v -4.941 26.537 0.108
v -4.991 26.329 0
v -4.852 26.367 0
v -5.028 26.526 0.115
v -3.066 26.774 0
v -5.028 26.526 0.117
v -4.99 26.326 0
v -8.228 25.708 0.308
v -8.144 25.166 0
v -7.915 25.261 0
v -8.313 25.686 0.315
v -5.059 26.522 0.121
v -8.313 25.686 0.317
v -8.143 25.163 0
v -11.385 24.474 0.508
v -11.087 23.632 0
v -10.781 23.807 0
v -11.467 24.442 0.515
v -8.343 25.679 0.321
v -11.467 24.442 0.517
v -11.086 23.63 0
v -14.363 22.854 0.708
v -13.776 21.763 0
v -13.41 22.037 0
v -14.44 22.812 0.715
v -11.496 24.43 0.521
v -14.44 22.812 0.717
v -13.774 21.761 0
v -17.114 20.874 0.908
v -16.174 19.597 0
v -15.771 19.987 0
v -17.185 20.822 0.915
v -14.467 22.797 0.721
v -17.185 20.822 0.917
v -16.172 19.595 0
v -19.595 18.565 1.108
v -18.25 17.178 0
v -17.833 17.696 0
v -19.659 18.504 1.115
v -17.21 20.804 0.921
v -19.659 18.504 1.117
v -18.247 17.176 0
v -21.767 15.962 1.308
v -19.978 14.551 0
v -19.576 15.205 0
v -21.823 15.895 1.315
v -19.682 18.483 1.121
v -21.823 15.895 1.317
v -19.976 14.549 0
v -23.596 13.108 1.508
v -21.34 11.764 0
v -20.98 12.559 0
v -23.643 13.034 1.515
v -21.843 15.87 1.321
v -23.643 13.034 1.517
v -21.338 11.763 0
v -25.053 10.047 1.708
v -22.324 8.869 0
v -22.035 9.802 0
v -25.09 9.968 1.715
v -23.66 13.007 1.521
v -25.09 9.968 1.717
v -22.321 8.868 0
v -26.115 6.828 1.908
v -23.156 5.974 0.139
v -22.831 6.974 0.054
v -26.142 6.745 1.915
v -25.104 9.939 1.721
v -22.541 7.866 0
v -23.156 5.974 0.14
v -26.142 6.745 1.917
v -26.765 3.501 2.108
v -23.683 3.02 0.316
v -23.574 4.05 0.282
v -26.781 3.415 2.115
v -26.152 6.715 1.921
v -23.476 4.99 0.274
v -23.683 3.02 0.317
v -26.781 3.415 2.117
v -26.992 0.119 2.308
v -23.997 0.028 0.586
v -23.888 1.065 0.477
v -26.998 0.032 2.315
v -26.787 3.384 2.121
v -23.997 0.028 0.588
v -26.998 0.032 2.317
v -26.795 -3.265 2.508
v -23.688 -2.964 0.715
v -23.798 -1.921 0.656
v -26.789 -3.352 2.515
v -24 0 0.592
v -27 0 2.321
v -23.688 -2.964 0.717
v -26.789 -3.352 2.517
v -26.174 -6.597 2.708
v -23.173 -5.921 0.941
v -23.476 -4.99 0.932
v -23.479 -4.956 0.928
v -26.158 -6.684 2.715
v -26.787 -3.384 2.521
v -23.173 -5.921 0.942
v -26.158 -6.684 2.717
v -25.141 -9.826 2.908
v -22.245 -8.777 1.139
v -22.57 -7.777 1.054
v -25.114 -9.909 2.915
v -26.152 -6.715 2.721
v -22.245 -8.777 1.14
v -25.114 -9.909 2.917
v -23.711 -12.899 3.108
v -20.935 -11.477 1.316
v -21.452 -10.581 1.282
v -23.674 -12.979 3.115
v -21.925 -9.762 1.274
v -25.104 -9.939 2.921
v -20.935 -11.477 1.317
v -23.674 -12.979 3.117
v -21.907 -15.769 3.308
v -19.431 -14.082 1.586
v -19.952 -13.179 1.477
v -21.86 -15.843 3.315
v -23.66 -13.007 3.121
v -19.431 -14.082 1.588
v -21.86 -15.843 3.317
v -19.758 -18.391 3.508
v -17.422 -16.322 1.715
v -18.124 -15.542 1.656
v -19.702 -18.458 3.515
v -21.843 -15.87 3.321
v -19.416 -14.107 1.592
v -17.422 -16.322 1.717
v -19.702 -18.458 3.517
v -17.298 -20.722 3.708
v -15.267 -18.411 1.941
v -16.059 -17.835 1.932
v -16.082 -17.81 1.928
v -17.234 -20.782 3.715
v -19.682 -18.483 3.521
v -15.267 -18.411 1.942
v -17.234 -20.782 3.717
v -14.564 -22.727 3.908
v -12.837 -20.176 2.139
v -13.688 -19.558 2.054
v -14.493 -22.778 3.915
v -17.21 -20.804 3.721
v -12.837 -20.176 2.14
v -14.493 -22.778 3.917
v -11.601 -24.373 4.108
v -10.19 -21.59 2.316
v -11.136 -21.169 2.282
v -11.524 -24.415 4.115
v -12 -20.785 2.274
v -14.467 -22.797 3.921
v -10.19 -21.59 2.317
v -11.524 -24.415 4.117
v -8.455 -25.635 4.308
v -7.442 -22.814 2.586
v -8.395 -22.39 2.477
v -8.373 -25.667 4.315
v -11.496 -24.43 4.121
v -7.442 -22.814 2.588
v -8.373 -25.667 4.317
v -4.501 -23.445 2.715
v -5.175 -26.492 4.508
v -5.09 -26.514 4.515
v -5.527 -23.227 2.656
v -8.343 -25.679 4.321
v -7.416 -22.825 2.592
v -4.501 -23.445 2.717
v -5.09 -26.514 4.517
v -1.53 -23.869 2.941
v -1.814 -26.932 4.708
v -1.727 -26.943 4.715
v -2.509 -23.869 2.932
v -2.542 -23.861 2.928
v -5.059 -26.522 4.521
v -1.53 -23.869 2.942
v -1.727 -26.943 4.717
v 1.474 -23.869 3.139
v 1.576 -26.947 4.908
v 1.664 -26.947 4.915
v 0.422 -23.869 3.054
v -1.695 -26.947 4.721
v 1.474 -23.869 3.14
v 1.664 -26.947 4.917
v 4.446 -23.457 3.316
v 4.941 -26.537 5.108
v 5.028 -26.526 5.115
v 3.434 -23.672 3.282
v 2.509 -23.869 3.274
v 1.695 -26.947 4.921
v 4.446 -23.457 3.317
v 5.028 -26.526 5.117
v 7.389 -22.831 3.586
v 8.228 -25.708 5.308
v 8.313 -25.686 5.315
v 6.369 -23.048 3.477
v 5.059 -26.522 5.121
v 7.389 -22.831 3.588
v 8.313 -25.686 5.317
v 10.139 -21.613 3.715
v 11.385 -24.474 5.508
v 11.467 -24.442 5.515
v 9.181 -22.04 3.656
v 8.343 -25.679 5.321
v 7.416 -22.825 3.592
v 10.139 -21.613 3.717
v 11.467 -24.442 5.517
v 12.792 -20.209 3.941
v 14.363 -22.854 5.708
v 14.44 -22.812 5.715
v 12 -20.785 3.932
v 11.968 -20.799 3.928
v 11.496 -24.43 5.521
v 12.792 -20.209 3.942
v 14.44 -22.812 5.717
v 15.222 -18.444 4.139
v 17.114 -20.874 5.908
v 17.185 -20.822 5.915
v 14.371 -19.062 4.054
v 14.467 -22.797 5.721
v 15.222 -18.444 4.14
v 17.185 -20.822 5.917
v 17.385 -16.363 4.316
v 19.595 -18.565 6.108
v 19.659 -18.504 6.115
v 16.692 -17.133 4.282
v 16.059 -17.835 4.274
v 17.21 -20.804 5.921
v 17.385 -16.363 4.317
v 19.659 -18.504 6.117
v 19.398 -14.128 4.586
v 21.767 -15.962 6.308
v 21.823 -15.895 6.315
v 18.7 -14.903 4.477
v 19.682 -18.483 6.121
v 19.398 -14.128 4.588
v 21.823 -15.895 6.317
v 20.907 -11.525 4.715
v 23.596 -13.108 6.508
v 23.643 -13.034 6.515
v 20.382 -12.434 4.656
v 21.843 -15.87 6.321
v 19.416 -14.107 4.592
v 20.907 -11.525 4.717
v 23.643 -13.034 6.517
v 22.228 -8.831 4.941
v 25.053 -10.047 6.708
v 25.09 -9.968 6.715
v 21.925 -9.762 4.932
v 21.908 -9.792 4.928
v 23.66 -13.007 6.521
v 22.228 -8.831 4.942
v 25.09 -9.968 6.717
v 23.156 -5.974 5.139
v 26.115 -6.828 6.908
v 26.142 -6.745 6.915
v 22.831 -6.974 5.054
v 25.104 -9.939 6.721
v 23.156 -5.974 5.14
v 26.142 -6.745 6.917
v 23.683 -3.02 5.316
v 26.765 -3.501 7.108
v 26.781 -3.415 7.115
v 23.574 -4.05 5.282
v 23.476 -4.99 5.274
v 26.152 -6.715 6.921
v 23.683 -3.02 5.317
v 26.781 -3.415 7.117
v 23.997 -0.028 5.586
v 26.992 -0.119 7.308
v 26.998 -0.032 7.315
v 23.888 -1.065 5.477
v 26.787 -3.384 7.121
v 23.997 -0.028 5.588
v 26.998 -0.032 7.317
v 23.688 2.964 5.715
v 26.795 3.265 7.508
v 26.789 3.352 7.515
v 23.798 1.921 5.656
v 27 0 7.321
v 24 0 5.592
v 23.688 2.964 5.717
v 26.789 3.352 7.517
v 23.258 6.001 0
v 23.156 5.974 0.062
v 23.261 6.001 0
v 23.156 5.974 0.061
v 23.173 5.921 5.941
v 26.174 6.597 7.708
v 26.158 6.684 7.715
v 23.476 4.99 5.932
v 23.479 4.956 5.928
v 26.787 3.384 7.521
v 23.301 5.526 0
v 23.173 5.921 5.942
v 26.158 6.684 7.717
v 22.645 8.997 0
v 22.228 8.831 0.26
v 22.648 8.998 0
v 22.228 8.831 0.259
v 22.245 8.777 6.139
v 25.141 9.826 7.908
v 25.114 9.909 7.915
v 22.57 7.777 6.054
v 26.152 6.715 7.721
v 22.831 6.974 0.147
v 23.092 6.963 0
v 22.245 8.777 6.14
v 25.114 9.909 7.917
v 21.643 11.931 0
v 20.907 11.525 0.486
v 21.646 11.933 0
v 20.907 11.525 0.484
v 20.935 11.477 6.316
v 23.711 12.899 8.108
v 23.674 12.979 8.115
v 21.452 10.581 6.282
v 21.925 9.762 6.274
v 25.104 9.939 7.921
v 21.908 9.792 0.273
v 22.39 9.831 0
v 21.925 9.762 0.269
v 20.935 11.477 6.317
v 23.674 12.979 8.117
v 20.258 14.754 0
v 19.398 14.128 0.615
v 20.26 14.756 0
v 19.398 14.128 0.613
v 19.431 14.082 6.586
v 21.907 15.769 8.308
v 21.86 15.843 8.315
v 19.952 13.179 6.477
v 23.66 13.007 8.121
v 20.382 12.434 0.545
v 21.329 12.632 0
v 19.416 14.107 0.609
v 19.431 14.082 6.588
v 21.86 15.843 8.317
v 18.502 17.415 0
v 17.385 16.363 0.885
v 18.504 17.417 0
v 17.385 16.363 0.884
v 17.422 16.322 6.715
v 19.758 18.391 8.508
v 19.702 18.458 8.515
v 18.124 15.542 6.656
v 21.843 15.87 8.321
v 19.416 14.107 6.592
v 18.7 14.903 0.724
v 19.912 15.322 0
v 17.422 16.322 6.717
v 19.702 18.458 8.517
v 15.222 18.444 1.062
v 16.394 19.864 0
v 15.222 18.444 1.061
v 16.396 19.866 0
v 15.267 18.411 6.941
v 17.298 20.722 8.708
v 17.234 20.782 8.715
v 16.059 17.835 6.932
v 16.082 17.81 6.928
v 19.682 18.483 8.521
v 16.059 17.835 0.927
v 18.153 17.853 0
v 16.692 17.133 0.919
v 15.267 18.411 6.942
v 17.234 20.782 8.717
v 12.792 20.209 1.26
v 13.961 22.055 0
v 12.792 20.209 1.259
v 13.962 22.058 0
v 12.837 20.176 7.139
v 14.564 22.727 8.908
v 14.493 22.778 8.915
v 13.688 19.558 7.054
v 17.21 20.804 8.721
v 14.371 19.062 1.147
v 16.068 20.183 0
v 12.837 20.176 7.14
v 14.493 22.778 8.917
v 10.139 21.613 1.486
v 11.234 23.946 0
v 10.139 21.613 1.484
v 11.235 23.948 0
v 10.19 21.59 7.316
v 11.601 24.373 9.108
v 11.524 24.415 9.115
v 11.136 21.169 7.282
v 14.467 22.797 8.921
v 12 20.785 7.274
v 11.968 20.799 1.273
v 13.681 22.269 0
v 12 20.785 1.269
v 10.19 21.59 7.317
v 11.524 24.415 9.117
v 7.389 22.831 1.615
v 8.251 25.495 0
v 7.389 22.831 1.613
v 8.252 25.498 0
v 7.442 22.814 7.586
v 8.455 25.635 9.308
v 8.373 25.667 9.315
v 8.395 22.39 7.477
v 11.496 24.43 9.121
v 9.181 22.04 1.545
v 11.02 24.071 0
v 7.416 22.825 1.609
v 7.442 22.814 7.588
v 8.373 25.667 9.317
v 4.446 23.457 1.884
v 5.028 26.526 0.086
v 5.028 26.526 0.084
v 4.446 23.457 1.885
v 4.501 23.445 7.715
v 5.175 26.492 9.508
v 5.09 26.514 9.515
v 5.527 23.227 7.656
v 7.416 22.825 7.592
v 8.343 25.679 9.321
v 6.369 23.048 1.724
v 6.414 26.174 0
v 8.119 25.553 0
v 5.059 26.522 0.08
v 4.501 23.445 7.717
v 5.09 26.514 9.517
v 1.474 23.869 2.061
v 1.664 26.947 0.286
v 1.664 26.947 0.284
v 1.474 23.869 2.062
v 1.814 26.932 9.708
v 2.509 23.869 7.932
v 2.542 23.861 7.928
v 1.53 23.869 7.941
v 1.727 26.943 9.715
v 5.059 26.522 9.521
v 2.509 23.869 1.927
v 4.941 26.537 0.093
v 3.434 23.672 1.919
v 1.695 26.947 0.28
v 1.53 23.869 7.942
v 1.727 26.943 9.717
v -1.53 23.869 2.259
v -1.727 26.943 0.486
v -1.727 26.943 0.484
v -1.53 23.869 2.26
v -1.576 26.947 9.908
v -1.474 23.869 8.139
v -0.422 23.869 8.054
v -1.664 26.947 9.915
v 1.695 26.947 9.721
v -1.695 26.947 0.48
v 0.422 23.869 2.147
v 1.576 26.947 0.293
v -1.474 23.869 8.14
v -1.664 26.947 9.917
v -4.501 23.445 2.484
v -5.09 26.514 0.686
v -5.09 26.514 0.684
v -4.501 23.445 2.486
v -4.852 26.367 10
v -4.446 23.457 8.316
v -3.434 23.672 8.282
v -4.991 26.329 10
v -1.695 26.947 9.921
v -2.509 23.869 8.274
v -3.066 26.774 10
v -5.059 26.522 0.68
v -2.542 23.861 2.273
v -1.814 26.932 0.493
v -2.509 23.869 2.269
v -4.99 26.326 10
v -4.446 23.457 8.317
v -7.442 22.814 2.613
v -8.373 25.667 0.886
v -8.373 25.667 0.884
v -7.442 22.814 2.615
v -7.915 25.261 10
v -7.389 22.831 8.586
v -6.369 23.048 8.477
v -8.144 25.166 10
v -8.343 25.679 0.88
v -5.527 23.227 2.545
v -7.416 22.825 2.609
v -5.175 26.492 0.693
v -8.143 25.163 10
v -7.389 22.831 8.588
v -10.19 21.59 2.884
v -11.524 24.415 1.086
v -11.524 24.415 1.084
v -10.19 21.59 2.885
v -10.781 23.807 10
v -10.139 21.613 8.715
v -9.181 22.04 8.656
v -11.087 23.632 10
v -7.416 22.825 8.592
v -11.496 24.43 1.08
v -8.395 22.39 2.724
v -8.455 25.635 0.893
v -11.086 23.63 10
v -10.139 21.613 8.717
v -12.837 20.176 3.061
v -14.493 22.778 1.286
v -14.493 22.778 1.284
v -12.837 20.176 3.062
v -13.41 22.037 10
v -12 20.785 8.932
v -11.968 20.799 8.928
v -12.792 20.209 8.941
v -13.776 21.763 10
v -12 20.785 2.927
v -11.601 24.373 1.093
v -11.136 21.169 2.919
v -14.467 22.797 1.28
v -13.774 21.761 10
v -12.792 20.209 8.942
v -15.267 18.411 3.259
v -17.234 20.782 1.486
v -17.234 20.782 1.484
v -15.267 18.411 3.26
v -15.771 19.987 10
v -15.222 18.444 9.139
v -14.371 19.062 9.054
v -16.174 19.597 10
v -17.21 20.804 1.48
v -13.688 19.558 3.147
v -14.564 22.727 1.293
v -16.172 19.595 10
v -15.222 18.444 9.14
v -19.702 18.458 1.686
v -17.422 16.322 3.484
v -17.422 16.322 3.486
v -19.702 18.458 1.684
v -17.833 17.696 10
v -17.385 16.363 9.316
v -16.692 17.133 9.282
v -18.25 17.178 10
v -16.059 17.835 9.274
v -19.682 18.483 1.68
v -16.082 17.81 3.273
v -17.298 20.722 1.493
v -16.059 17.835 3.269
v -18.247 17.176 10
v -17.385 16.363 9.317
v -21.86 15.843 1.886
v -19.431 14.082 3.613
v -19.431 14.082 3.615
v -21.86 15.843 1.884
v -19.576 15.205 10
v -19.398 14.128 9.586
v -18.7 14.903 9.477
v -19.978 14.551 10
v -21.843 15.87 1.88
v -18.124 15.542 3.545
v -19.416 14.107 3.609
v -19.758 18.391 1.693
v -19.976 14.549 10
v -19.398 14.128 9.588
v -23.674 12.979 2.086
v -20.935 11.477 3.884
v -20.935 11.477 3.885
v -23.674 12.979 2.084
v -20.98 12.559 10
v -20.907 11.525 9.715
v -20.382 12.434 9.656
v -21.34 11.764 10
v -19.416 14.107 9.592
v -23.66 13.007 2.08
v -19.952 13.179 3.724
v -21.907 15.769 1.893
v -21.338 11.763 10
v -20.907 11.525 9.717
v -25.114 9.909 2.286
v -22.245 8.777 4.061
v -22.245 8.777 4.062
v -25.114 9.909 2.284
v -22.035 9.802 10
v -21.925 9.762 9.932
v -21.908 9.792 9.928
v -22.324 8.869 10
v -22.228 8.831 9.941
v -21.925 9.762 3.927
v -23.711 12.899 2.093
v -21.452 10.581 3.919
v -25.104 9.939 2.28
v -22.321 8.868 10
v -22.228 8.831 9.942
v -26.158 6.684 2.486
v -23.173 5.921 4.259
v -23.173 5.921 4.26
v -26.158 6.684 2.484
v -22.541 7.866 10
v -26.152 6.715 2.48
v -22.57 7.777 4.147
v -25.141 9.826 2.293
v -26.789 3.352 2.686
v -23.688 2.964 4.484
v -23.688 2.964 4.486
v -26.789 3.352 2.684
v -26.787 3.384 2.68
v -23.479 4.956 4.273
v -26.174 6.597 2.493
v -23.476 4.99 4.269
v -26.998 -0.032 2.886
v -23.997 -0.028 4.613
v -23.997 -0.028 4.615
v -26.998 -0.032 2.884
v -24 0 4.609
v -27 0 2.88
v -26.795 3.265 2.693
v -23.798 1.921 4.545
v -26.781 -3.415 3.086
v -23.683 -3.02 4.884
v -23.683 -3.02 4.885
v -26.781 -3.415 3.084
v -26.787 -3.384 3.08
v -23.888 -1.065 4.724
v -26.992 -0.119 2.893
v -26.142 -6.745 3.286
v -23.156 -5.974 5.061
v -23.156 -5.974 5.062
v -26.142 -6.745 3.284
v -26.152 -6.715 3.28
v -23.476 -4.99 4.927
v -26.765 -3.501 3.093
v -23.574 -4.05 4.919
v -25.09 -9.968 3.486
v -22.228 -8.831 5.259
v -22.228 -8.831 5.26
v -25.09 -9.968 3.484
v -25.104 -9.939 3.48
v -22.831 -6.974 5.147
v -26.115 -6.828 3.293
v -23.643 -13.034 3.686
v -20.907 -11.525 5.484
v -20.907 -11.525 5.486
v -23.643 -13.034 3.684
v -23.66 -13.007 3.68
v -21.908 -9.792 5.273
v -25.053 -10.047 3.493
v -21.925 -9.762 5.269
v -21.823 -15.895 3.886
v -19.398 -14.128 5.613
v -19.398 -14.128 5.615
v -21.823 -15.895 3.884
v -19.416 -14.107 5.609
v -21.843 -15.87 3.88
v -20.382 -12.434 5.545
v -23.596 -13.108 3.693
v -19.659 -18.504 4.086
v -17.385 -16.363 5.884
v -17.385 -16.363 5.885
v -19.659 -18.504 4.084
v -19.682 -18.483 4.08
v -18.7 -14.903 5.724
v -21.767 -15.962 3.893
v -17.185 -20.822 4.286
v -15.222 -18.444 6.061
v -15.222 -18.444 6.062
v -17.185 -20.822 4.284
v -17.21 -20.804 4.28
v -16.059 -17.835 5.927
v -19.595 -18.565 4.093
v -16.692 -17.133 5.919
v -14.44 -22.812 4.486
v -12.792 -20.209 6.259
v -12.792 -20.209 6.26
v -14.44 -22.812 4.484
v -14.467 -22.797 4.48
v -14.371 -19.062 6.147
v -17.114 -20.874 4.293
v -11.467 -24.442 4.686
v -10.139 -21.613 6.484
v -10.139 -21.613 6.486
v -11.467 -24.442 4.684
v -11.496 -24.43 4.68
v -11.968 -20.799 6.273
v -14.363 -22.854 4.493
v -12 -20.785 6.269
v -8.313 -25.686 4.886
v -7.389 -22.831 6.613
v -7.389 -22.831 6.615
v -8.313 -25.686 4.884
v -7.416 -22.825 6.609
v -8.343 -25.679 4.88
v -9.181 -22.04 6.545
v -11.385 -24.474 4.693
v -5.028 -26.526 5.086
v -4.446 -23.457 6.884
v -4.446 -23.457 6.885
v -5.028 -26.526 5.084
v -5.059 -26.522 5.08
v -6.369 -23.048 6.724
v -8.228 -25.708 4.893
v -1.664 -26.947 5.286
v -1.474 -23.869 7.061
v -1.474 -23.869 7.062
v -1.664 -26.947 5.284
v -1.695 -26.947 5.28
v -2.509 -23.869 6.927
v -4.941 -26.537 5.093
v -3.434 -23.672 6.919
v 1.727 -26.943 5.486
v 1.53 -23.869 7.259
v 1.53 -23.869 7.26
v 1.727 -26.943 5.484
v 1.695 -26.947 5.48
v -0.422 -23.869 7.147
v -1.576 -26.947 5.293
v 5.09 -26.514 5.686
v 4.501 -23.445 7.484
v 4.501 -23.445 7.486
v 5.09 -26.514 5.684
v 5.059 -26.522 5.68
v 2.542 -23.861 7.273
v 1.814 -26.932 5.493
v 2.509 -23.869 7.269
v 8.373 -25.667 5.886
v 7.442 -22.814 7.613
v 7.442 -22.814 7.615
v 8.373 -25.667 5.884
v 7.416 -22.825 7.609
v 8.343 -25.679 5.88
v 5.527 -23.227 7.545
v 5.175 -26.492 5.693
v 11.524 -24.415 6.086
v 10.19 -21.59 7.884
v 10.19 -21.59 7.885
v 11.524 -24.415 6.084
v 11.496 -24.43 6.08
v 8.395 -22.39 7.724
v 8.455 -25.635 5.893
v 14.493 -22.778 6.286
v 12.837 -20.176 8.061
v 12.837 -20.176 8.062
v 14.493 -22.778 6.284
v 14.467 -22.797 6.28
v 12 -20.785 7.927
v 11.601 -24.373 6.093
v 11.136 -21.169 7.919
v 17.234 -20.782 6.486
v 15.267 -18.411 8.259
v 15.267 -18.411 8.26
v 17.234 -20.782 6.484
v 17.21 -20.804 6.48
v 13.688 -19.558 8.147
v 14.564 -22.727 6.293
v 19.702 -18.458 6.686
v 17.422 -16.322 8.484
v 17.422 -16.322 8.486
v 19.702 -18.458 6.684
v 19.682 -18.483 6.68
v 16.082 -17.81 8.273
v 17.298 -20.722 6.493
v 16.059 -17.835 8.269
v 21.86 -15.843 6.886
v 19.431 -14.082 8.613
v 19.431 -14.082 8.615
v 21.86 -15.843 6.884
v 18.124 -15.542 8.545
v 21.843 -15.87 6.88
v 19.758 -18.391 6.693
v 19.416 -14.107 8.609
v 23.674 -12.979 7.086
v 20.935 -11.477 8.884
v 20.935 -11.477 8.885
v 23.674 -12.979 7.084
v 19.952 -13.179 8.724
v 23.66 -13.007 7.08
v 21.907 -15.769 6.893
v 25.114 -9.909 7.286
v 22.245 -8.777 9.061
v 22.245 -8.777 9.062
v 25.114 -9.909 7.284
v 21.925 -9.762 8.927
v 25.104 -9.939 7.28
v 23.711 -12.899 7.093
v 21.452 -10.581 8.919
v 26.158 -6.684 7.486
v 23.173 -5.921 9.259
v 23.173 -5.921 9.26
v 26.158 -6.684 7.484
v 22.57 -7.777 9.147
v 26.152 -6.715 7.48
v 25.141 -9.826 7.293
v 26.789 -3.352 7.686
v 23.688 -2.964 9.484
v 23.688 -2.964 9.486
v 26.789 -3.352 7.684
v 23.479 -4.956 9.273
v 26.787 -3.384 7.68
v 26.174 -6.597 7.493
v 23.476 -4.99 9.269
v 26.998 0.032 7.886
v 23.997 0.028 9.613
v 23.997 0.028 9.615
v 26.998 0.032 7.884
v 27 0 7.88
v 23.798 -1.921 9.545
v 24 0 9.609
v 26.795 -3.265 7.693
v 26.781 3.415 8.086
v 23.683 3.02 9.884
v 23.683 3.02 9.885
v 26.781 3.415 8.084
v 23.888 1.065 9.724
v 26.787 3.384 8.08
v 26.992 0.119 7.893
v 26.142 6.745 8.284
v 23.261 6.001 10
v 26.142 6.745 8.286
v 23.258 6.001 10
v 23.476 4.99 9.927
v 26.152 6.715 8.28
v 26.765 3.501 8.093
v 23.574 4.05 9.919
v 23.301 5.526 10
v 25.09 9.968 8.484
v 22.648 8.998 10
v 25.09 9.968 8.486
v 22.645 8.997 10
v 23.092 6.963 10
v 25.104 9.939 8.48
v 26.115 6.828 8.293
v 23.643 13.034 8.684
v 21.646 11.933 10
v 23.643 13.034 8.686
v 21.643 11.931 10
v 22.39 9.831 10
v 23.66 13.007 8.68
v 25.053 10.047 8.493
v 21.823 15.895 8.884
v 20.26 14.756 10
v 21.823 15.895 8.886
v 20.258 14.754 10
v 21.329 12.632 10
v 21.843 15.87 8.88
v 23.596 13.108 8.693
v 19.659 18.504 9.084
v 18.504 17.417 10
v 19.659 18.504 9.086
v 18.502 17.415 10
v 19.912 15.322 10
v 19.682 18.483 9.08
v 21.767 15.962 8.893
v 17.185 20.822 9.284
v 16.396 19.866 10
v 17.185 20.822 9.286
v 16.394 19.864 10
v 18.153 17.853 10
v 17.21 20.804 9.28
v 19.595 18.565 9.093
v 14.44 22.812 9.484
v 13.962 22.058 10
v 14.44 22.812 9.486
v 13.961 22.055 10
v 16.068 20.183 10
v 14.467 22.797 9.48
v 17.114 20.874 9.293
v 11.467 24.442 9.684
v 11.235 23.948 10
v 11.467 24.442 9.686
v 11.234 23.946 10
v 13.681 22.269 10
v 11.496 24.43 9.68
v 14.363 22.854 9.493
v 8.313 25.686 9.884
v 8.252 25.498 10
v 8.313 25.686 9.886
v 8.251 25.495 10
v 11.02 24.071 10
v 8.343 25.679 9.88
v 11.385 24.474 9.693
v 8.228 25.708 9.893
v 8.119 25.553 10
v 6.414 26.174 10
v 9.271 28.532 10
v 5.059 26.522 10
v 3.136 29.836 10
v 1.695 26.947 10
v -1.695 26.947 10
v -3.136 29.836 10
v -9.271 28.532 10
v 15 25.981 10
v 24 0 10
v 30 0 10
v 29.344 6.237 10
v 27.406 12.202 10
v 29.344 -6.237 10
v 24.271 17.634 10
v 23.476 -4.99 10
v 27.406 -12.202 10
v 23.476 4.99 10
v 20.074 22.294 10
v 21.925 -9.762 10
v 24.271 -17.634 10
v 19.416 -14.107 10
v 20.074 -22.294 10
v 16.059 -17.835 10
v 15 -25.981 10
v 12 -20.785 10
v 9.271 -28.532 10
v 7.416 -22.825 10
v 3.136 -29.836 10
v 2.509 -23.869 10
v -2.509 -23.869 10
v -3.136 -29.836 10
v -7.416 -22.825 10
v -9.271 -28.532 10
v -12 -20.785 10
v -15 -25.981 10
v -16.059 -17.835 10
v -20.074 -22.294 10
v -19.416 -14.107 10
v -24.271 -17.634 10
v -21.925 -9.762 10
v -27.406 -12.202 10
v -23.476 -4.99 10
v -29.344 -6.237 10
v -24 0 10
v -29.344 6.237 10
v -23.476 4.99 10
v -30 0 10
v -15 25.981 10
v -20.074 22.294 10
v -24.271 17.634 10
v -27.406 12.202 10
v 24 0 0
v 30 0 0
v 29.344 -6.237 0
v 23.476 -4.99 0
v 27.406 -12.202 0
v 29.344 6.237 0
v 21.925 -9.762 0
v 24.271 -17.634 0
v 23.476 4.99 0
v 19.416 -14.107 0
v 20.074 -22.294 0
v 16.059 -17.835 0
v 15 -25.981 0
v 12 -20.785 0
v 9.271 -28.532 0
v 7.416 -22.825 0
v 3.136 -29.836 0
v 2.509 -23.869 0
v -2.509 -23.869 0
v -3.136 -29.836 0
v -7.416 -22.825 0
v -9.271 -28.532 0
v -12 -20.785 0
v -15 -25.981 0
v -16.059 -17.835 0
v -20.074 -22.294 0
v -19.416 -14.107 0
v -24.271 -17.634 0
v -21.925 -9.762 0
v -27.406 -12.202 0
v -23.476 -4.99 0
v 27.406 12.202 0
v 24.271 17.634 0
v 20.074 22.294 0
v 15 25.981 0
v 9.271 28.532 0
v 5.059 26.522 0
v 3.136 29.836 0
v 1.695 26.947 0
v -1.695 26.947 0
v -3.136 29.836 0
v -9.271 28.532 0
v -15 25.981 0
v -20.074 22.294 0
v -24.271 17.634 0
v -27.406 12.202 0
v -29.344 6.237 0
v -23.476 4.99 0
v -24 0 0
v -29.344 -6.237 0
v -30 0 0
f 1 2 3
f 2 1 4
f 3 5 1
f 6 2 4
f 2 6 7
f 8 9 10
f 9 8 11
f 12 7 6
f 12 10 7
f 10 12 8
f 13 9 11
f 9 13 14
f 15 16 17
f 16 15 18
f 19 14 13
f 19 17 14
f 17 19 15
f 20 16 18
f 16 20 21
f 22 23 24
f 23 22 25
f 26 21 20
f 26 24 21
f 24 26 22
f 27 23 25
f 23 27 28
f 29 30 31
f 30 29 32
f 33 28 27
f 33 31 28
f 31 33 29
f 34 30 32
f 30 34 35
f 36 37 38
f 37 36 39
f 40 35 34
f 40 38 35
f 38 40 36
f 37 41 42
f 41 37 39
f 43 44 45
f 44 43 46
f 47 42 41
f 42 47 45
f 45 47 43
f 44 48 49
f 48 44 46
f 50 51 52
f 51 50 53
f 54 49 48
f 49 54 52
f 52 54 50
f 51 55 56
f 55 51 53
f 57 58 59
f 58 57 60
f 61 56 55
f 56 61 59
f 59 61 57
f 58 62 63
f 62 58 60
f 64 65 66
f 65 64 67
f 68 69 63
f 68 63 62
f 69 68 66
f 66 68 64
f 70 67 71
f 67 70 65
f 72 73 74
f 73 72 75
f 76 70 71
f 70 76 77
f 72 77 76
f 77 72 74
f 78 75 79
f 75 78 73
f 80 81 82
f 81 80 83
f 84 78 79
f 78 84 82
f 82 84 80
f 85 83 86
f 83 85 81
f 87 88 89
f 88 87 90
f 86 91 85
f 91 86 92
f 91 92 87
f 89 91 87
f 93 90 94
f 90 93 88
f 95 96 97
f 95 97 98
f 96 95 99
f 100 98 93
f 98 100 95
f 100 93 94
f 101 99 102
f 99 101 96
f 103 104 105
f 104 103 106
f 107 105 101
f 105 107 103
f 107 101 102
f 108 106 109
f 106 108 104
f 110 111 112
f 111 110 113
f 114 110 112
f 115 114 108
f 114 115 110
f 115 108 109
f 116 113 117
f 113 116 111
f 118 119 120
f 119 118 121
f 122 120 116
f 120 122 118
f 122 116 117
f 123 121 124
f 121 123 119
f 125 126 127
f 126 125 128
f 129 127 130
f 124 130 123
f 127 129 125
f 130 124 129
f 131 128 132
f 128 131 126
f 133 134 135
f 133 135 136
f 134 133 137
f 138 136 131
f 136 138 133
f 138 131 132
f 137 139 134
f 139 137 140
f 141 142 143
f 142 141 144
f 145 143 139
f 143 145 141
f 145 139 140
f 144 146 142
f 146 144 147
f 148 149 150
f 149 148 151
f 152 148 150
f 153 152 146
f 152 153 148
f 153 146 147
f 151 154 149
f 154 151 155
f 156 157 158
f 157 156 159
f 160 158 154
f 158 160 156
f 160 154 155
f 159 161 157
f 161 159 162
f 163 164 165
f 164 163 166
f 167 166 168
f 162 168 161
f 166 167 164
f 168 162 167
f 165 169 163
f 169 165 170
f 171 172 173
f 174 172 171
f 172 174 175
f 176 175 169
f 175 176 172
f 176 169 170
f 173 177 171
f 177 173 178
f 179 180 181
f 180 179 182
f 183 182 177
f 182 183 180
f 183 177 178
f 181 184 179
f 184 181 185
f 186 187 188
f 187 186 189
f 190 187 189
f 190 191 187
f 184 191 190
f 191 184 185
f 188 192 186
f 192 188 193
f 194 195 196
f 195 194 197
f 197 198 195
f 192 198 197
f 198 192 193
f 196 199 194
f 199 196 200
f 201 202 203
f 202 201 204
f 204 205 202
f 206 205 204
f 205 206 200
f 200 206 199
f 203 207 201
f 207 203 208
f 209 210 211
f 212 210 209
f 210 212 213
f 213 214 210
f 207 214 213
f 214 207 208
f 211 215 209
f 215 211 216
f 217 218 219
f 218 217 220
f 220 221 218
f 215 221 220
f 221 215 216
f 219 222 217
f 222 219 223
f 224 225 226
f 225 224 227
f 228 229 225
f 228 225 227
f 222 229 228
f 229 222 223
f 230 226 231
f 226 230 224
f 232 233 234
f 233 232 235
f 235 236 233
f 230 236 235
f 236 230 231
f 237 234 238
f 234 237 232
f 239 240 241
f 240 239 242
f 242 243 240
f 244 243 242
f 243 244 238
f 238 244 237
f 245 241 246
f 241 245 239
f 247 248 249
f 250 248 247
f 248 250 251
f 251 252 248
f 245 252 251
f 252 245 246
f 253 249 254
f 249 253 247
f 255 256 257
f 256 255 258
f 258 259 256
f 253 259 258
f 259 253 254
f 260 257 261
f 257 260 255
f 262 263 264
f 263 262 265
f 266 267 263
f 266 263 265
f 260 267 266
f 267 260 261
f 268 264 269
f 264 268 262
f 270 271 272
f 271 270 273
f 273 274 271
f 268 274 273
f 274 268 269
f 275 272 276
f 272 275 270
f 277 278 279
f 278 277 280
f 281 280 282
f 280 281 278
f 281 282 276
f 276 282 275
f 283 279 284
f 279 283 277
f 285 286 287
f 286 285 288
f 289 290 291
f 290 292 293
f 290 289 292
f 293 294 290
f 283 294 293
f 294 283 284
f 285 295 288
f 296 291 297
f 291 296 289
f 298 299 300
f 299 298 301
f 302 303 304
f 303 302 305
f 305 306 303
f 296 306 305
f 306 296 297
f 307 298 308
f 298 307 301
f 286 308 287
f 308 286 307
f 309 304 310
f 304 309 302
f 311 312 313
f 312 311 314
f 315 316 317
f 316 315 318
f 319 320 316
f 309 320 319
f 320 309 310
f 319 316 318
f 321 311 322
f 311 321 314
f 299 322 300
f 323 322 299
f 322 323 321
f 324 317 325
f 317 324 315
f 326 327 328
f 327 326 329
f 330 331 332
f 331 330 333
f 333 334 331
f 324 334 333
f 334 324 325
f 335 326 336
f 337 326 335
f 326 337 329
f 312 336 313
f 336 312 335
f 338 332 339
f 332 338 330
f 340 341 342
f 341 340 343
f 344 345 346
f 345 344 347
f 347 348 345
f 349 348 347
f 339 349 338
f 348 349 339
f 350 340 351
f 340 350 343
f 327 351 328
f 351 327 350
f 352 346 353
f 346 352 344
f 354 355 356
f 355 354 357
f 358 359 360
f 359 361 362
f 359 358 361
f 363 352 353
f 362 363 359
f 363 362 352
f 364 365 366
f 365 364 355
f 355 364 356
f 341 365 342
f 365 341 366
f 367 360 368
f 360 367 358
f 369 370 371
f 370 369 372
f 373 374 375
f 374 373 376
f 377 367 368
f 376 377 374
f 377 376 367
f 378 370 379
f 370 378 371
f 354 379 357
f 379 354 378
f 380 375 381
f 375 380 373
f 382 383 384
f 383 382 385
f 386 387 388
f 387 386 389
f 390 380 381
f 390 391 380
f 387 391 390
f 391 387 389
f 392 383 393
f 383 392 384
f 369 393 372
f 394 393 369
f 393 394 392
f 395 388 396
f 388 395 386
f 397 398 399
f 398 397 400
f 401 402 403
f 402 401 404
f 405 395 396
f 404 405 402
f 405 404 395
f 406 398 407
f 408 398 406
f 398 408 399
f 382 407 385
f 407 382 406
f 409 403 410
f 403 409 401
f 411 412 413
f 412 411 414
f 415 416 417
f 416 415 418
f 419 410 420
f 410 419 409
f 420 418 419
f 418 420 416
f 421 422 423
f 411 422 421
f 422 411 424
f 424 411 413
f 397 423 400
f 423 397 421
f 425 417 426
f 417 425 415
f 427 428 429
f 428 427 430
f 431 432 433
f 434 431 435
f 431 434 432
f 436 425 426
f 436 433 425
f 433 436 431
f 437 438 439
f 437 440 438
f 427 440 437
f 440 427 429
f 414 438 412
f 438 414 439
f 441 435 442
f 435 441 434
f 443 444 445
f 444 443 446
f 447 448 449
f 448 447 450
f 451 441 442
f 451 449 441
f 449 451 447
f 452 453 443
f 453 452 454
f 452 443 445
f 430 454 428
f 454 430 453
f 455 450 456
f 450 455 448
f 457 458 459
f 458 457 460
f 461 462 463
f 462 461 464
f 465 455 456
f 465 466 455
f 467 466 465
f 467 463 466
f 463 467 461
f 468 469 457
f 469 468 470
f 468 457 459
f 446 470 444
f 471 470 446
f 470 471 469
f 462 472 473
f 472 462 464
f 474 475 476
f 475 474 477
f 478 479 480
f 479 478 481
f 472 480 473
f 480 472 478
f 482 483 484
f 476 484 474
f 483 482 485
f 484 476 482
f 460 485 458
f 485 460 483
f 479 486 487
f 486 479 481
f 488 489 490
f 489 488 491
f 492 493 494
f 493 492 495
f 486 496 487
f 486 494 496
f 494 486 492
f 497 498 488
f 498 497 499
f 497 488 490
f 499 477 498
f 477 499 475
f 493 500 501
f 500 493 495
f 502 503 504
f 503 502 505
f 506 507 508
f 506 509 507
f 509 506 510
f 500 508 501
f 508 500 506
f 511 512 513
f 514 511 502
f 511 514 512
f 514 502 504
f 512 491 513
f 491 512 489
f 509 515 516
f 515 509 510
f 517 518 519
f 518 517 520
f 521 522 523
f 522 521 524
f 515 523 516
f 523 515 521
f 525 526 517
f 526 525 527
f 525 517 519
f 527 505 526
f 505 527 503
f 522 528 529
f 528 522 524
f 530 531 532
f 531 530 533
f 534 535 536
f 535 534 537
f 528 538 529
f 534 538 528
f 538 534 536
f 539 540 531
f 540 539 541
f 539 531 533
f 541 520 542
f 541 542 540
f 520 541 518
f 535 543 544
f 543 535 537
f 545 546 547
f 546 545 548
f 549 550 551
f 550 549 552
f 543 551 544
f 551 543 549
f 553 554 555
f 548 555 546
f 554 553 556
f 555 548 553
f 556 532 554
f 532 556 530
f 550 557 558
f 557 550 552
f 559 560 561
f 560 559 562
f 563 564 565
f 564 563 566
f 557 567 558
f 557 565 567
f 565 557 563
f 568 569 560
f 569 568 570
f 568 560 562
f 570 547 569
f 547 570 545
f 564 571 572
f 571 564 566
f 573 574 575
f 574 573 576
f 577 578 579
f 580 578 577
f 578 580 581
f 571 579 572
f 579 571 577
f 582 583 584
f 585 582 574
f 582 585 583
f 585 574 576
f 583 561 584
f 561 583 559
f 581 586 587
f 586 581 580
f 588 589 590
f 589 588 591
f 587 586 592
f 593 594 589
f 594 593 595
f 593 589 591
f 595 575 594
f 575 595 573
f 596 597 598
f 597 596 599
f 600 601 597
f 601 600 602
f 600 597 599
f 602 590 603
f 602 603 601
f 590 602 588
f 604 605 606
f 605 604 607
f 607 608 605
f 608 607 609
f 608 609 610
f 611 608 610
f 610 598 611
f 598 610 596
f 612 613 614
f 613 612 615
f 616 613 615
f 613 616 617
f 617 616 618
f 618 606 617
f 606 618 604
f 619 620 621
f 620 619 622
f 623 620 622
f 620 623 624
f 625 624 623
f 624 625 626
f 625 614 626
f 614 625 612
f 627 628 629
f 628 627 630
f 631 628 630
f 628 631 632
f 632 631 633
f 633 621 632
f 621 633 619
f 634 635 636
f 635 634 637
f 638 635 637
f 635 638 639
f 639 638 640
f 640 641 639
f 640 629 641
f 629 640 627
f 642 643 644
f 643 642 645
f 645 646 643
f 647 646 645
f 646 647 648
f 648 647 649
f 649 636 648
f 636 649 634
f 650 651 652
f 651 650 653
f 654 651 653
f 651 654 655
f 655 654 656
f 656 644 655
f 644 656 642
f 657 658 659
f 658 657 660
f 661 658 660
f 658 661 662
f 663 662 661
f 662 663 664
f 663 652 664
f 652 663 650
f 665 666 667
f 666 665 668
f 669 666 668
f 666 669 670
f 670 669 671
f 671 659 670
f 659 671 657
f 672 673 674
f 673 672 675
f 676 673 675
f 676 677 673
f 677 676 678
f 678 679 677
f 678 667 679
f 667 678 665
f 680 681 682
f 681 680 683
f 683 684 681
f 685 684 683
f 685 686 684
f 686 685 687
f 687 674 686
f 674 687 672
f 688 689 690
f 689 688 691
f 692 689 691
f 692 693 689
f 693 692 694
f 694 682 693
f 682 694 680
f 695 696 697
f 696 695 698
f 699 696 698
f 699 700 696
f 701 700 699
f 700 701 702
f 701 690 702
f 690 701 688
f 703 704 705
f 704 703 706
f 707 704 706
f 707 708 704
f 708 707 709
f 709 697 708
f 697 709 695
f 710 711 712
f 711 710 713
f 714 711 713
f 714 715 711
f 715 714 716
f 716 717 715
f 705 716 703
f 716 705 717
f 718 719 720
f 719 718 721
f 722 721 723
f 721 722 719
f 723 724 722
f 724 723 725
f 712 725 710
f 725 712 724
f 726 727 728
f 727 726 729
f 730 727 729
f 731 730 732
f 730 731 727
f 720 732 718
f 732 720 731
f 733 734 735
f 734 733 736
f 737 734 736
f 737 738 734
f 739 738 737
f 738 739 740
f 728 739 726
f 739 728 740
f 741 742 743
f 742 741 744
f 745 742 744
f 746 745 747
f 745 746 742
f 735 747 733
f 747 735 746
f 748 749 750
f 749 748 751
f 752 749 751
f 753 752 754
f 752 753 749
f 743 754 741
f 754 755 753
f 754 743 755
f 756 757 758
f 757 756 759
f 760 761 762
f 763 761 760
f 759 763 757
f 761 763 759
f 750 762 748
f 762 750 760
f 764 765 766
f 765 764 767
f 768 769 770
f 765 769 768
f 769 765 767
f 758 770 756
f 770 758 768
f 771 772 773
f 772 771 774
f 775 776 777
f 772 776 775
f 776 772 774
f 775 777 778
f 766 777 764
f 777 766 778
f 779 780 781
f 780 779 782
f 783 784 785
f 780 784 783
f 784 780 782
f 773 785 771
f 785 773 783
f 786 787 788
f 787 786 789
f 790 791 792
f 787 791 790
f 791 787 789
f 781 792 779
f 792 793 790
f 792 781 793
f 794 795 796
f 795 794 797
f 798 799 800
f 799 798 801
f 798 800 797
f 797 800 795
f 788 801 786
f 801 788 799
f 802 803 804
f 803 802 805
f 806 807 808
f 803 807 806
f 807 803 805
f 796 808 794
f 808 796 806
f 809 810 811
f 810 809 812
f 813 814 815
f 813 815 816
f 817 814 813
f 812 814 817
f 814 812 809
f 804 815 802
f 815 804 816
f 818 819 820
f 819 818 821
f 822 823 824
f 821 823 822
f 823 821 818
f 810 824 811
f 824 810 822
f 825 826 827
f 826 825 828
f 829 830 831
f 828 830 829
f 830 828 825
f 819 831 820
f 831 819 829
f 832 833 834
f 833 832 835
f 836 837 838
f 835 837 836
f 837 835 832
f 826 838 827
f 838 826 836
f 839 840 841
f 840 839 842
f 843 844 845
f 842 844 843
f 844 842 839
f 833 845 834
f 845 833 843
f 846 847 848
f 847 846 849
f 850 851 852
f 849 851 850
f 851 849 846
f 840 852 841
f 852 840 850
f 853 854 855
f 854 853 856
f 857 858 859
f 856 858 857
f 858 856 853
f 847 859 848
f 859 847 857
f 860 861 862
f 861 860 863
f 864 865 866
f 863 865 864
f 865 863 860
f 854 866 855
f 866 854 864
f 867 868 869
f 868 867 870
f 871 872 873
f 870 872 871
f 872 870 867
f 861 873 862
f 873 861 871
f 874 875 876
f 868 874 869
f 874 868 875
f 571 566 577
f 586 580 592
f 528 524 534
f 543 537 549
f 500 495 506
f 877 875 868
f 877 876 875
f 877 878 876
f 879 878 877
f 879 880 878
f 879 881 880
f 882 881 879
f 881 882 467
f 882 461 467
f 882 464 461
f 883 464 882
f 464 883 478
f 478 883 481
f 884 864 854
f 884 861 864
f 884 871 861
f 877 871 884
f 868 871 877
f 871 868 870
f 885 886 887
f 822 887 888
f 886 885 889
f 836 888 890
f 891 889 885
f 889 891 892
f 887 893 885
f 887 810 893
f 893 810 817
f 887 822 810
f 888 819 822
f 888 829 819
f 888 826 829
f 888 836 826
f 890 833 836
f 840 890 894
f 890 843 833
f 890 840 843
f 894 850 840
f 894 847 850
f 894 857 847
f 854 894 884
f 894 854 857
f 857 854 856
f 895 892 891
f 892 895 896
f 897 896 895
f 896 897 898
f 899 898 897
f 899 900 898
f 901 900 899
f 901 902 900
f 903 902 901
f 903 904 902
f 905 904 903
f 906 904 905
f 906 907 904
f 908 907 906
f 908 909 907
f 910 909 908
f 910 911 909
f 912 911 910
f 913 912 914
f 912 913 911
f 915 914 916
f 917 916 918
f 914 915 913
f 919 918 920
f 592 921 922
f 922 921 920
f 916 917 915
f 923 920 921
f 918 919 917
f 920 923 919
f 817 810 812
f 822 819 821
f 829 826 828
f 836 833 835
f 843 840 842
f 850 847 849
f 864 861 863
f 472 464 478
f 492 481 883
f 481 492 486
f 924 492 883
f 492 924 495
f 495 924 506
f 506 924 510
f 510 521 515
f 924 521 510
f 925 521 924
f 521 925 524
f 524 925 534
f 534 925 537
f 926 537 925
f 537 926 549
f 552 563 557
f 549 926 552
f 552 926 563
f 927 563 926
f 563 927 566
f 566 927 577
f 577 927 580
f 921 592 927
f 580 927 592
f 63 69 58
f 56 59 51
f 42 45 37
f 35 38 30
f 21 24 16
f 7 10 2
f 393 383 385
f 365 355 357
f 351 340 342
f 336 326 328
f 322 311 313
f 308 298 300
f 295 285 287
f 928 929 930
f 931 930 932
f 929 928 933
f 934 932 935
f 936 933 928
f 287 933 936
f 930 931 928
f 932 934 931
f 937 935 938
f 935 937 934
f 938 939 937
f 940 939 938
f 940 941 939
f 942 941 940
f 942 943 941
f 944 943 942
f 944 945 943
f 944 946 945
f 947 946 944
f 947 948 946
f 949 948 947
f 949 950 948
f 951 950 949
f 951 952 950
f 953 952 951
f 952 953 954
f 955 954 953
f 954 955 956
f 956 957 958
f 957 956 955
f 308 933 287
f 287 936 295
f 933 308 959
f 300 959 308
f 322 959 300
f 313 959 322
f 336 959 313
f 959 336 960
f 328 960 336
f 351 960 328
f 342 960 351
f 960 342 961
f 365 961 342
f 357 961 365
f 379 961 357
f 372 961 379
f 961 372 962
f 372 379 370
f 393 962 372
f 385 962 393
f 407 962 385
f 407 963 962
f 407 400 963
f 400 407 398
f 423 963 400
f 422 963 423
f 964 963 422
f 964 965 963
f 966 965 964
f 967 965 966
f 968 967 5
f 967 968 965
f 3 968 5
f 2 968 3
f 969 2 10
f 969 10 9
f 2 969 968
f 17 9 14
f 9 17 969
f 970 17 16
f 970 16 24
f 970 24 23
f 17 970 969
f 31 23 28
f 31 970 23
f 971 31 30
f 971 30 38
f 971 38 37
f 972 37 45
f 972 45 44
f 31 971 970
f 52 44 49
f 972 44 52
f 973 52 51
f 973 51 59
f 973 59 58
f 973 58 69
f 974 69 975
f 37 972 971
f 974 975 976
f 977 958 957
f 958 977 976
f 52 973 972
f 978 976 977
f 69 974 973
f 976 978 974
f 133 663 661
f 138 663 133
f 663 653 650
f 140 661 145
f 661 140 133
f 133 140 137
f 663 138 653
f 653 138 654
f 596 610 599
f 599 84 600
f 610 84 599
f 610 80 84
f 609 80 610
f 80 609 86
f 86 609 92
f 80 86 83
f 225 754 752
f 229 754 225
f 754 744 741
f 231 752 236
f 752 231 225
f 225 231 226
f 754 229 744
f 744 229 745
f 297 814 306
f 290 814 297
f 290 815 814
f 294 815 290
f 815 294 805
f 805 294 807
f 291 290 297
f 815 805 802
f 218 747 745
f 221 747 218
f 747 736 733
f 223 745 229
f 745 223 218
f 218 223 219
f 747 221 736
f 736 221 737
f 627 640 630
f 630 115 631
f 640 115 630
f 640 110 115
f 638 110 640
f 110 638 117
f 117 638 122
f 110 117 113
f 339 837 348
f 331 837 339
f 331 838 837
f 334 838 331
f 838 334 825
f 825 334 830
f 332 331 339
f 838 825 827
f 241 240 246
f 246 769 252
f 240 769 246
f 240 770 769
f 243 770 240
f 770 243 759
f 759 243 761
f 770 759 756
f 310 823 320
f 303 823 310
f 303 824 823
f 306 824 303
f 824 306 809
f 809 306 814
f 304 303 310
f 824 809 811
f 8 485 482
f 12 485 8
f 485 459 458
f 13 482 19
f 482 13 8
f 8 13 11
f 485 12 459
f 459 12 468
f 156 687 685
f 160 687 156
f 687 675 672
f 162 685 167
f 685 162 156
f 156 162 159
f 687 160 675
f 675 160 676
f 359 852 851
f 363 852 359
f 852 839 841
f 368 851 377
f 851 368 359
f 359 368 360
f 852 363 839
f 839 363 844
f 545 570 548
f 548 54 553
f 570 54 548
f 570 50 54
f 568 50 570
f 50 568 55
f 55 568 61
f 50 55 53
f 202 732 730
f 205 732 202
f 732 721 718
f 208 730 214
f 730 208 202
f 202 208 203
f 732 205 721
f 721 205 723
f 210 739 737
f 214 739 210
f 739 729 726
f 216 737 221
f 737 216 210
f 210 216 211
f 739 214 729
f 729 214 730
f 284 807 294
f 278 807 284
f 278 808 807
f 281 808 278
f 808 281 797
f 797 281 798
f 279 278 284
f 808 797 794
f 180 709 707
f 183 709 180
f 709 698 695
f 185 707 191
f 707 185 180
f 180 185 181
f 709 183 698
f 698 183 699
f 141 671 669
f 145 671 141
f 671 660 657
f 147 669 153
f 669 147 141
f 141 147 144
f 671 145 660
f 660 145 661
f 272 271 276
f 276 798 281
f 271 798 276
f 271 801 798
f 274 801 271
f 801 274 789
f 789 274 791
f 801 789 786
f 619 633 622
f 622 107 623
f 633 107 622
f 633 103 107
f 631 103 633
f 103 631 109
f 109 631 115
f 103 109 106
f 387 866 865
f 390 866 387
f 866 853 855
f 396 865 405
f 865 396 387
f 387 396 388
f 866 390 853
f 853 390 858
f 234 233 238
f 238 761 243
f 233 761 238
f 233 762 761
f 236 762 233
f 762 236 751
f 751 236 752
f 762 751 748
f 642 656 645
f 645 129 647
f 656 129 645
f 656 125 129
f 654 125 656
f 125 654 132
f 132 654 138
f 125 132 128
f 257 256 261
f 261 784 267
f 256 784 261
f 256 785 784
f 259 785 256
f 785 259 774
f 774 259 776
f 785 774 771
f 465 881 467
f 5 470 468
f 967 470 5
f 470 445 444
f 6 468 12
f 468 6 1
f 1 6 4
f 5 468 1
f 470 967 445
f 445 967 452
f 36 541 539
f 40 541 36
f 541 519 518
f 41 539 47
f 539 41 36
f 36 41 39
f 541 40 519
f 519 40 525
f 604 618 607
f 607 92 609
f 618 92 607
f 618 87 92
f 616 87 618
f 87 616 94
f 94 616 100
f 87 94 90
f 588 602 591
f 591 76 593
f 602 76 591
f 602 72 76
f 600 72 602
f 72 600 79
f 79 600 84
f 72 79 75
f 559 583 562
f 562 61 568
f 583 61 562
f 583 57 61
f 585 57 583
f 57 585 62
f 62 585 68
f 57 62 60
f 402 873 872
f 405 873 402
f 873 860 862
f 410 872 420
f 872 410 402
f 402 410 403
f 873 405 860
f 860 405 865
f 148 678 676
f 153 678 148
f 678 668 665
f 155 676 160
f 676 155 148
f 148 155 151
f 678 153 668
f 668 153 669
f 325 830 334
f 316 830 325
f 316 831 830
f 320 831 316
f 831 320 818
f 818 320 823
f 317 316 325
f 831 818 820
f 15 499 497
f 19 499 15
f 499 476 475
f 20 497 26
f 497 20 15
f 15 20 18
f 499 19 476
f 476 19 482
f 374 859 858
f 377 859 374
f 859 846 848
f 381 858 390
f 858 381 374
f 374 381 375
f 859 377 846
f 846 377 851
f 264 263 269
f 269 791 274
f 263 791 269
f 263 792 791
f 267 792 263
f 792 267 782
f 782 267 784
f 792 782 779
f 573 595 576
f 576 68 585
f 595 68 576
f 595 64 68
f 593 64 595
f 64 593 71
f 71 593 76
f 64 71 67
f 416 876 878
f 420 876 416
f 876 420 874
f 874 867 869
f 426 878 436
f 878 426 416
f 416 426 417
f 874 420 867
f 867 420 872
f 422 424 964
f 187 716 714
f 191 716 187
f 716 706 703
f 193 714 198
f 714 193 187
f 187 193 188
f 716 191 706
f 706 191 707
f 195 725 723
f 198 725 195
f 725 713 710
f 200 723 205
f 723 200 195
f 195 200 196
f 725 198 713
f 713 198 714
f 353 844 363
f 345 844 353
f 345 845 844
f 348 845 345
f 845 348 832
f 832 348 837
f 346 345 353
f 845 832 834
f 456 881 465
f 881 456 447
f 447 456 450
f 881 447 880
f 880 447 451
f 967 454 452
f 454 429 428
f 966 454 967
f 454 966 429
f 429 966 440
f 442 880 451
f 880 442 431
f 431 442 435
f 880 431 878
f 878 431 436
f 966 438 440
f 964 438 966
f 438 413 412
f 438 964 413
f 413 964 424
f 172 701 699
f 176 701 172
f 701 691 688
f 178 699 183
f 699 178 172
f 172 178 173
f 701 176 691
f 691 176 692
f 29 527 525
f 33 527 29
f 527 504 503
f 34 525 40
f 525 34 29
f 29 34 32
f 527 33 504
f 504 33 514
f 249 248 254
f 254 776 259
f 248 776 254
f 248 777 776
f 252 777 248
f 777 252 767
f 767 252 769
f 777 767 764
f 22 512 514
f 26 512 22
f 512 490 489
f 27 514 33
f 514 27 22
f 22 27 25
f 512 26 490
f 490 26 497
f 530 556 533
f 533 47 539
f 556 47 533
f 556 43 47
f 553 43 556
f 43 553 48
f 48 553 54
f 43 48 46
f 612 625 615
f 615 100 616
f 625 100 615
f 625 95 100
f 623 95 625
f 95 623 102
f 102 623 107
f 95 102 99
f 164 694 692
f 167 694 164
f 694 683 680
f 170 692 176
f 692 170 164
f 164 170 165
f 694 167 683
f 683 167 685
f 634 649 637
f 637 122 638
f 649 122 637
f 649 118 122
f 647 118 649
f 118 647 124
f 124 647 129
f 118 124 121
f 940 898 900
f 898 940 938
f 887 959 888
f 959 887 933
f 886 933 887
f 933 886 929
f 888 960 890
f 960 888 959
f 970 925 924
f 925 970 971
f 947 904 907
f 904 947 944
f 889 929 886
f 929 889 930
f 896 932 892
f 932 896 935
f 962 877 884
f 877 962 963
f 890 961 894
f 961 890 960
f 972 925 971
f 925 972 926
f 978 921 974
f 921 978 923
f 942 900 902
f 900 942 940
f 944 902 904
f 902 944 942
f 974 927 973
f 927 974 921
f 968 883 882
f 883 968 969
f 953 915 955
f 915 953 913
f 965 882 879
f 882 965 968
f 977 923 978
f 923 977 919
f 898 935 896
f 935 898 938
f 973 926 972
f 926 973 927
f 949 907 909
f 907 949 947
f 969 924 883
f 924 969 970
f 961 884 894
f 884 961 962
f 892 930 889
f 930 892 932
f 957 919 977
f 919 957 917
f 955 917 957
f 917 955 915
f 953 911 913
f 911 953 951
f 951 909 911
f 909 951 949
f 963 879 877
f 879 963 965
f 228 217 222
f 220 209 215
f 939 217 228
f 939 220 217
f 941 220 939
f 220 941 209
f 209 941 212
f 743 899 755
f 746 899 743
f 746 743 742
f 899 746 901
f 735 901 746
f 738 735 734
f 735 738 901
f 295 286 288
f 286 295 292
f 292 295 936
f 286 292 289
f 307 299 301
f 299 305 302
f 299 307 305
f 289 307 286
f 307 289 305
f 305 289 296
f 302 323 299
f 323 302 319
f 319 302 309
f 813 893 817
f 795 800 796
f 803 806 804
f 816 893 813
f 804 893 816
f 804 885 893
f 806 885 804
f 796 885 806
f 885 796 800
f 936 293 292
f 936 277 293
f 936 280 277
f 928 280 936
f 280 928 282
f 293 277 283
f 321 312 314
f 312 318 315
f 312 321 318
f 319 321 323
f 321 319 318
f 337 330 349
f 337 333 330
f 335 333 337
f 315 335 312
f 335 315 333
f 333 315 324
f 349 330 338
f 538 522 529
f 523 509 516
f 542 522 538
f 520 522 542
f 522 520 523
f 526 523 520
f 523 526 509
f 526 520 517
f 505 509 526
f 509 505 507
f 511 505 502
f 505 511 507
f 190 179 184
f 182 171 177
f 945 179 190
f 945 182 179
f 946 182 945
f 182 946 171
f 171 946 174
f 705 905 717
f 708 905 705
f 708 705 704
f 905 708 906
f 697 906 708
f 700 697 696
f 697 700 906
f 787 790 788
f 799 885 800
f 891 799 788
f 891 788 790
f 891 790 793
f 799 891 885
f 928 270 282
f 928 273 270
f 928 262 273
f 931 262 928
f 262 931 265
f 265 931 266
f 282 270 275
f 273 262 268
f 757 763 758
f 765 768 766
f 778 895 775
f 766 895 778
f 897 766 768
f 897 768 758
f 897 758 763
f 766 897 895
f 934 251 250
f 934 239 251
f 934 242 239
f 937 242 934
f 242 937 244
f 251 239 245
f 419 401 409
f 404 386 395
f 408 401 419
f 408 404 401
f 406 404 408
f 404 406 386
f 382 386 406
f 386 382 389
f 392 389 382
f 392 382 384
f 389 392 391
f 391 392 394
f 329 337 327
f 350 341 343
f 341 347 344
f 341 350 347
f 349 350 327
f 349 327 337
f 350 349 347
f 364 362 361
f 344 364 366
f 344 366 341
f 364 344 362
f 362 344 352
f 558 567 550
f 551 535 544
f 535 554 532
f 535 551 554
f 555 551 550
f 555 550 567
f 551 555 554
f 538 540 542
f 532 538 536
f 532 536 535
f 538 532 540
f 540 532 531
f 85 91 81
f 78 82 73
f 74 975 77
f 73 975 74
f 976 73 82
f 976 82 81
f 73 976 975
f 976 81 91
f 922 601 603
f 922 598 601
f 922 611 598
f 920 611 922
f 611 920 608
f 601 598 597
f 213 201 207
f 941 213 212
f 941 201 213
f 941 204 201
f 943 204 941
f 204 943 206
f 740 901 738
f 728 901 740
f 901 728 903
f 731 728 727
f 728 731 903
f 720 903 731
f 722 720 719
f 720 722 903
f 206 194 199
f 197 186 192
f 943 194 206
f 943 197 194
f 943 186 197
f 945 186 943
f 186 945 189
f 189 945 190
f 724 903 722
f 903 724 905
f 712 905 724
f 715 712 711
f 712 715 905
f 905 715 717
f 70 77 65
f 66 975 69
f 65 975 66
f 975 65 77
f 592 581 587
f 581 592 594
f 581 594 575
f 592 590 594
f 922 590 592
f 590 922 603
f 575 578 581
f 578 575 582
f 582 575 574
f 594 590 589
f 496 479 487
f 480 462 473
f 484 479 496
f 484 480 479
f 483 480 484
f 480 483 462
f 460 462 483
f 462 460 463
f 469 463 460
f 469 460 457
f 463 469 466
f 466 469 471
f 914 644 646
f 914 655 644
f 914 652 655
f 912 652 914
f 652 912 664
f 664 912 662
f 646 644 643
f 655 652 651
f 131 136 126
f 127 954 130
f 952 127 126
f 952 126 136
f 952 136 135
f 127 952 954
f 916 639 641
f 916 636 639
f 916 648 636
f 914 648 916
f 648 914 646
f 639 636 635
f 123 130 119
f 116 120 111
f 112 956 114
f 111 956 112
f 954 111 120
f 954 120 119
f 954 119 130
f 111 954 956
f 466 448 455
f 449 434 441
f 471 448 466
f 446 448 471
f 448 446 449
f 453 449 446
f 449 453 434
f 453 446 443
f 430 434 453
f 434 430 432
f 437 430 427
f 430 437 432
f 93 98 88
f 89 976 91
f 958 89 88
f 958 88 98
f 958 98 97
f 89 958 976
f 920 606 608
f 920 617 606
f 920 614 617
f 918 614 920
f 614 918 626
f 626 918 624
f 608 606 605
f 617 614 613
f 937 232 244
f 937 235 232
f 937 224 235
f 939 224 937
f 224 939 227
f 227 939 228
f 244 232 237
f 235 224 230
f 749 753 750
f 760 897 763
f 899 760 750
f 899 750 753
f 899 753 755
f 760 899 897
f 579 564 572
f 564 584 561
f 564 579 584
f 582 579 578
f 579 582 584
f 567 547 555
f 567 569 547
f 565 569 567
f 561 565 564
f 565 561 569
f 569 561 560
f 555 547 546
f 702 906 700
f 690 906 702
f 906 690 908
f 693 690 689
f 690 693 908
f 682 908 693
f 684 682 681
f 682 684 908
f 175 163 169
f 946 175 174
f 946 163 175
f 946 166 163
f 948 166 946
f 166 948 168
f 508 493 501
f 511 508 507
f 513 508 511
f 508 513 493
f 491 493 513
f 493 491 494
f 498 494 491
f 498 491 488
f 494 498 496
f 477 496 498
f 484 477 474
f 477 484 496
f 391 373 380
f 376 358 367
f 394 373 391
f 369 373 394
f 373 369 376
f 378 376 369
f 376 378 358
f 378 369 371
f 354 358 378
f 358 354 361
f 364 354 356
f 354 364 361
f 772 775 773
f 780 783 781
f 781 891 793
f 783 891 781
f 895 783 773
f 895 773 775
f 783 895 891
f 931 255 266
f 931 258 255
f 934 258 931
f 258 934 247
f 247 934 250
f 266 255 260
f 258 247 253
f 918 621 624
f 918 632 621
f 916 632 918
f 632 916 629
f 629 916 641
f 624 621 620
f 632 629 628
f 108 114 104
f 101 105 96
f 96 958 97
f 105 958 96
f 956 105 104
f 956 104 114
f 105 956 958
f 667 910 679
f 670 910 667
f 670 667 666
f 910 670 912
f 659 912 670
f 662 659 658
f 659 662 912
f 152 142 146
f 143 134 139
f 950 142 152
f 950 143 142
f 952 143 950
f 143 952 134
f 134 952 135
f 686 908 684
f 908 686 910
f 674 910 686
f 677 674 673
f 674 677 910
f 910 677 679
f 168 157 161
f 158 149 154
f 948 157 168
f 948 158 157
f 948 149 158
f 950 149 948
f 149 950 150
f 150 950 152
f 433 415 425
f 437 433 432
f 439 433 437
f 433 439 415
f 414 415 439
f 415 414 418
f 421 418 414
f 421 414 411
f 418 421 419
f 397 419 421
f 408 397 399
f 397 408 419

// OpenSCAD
include <Threads.scad>;
/* [main] */

// The length of the auger
height=10;

// How big the outside of the auger will be
outer_dia=60;

// How big the inside of the auger will be
inner_dia=48;

// How thick the auger paddles will be (useful for creating ACME threaded rods!)
thread_thickness=10;

// How thick the auger paddles will be (useful for creating ACME threaded rods!)
thread_step=10;

// How thick the auger paddles will be (useful for creating ACME threaded rods!)
thread_count=1;

// How thick the auger paddles will be (useful for creating ACME threaded rods!)
thread_form = "rectangle";


/* [hidden] */
pi=3.14159265358979323846264338327950288;

module thread(diameter){
	minimalStep = thread_step/360;
    union() {
        for(n=[0:thread_step:height]){
            translate([0,0,n]) intersection() for(angle=[0:2:360]){
                rotate([0,0,angle]) {
                     translate([diameter/2,0,angle*minimalStep]){
                        sphere(d = thread_thickness);
                        // cube(size = [thread_thickness, thread_thickness, thread_thickness]);
                     }
                }
            }
        }
    }
}

module tubeThreaded(){
    thread(inner_dia);
}
    
module tubeThreadedModule(){
	difference() {
        cylinder(r=outer_dia/2,h=height);
        cylinder(r=inner_dia/2,h=height);
        metric_thread(
            diameter = inner_dia + (outer_dia - inner_dia)/2,
            pitch = thread_step,
            thread_size = thread_thickness,
            length = height,
            groove = true,
            internal = true
        );
    }
}

/*
linear_extrude(height = 10, center = false, convexity = 10, twist = 360, slices = 100)
translate([inner_dia/2, 0, 0])
circle(r = thread_thickness/2, $fn=25);
*/

tubeThreadedModule();
